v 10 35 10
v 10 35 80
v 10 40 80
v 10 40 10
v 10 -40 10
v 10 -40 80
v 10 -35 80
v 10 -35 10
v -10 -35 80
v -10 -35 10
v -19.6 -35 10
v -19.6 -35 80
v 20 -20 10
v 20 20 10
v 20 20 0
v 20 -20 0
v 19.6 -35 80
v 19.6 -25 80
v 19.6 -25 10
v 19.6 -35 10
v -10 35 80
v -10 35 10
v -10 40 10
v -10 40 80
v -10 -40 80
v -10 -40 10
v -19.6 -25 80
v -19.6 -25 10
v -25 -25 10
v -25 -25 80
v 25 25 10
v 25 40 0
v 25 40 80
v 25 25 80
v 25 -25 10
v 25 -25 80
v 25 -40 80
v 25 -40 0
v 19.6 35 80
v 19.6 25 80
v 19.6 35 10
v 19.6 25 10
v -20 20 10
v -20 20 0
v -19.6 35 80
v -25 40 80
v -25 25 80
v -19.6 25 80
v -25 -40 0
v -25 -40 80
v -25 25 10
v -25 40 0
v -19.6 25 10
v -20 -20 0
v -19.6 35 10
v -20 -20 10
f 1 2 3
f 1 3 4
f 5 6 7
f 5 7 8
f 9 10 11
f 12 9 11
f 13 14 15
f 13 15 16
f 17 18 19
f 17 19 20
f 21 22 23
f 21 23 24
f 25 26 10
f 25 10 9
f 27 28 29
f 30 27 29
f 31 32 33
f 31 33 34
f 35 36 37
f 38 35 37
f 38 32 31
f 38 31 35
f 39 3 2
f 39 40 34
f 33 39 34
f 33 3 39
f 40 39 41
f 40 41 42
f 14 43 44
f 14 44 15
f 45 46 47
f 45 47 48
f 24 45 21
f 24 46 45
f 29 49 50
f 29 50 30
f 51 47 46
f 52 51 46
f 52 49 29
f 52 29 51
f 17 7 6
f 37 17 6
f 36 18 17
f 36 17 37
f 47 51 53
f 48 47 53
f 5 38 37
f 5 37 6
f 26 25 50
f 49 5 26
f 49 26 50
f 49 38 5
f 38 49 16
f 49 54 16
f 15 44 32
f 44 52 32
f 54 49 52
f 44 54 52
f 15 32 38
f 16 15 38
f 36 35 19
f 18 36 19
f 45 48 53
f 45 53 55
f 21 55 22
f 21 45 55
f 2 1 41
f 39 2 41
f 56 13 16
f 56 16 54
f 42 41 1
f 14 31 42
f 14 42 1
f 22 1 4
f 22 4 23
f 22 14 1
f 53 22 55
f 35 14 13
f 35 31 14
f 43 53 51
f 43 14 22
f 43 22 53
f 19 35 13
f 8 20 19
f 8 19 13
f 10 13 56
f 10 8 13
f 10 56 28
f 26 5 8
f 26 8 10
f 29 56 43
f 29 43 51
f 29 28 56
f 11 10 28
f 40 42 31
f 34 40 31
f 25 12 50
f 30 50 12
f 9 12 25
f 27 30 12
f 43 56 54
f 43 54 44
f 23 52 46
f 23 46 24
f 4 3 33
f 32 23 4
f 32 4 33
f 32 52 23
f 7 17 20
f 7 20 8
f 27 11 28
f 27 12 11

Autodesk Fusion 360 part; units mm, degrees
sketch "スケッチ1" plane through (0, 0, 0) normal (0, 0, 1) x (1, 0, 0)
  line L0 (25, -40) -> (-25, -40)
  line L1 (-25, -40) -> (-25, 40)
  line L2 (-25, 40) -> (25, 40)
  line L3 (25, 40) -> (25, -40)
  line L4 (25, -40) -> (-25, 40) construction
  line L5 (-25, -40) -> (25, 40) construction
  dimension "d1" = 50
  dimension "d2" = 80
extrude "押し出し1" add sketch "スケッチ1" along normal blind 80
sketch "スケッチ2" plane through (0, 0, 80) normal (0, 0, 1) x (-1, 0, 0)
  line L0 (-25, -40) -> (25, -40)
  line L1 (25, -40) -> (25, 40)
  line L2 (25, 40) -> (-25, 40)
  line L3 (-25, 40) -> (-25, -40)
  line L4 (-19.6, 35) -> (19.6, 35)
  line L5 (19.6, 35) -> (19.6, -35)
  line L6 (19.6, -35) -> (-19.6, -35)
  line L7 (-19.6, -35) -> (-19.6, 35)
  line L8 (-19.6, 35) -> (19.6, -35) construction
  line L9 (19.6, 35) -> (-19.6, -35) construction
  dimension "d5" = 39.2
  dimension "d6" = 70
extrude "押し出し2" cut sketch "スケッチ2" against normal blind 70 contours L4 L5 L6 L7
sketch "スケッチ4" plane through (0, 0, 80) normal (0, 0, 1) x (-1, 0, 0)
  line L0 (19.6, 35) -> (19.6, -35)
  line L1 (19.6, -35) -> (-19.6, -35)
  line L2 (-19.6, -35) -> (-19.6, 35)
  line L3 (-19.6, 35) -> (19.6, 35)
  line L4 (-25, -40) -> (25, -40)
  line L5 (25, -40) -> (25, 40)
  line L6 (25, 40) -> (-25, 40)
  line L7 (-25, 40) -> (-25, -40)
  line L8 (-30, 25) -> (30, 25)
  line L9 (30, 25) -> (30, -25)
  line L10 (30, -25) -> (-30, -25)
  line L11 (-30, -25) -> (-30, 25)
  line L12 (-30, 25) -> (30, -25) construction
  line L13 (30, 25) -> (-30, -25) construction
  dimension "d11" = 60
  dimension "d12" = 50
extrude "押し出し4" cut sketch "スケッチ4" against normal blind 70 contours L0 L5 L8 L10 | L2 L7 L8 L10
sketch "スケッチ5" plane through (0, 0, 10) normal (0, 0, 1) x (-1, 0, 0)
  line L0 (-19.6, -35) -> (19.6, -35)
  line L1 (19.6, -35) -> (19.6, -25)
  line L2 (19.6, -25) -> (25, -25)
  line L3 (25, -25) -> (25, 25)
  line L4 (25, 25) -> (19.6, 25)
  line L5 (19.6, 25) -> (19.6, 35)
  line L6 (19.6, 35) -> (-19.6, 35)
  line L7 (-19.6, 35) -> (-19.6, 25)
  line L8 (-19.6, 25) -> (-25, 25)
  line L9 (-25, 25) -> (-25, -25)
  line L10 (-25, -25) -> (-19.6, -25)
  line L11 (-19.6, -25) -> (-19.6, -35)
  line L12 (-20, 20) -> (20, 20)
  line L13 (20, 20) -> (20, -20)
  line L14 (20, -20) -> (-20, -20)
  line L15 (-20, -20) -> (-20, 20)
  line L16 (-20, 20) -> (20, -20) construction
  line L17 (20, 20) -> (-20, -20) construction
extrude "押し出し5" cut sketch "スケッチ5" against normal blind 10 contours L12 L13 L14 L15
sketch "スケッチ6" plane through (0, -40, 0) normal (0, -1, 0) x (1, 0, 0)
  line L0 (-25, 0) -> (25, 0)
  line L1 (25, 0) -> (25, 80)
  line L2 (25, 80) -> (-25, 80)
  line L3 (-25, 80) -> (-25, 0)
  line L4 (-10, 80) -> (10, 80)
  line L5 (10, 80) -> (10, 10)
  line L6 (10, 10) -> (-10, 10)
  line L7 (-10, 10) -> (-10, 80)
extrude "押し出し6" cut sketch "スケッチ6" against normal blind 100 contours L2 L4 L5 L6 L7
